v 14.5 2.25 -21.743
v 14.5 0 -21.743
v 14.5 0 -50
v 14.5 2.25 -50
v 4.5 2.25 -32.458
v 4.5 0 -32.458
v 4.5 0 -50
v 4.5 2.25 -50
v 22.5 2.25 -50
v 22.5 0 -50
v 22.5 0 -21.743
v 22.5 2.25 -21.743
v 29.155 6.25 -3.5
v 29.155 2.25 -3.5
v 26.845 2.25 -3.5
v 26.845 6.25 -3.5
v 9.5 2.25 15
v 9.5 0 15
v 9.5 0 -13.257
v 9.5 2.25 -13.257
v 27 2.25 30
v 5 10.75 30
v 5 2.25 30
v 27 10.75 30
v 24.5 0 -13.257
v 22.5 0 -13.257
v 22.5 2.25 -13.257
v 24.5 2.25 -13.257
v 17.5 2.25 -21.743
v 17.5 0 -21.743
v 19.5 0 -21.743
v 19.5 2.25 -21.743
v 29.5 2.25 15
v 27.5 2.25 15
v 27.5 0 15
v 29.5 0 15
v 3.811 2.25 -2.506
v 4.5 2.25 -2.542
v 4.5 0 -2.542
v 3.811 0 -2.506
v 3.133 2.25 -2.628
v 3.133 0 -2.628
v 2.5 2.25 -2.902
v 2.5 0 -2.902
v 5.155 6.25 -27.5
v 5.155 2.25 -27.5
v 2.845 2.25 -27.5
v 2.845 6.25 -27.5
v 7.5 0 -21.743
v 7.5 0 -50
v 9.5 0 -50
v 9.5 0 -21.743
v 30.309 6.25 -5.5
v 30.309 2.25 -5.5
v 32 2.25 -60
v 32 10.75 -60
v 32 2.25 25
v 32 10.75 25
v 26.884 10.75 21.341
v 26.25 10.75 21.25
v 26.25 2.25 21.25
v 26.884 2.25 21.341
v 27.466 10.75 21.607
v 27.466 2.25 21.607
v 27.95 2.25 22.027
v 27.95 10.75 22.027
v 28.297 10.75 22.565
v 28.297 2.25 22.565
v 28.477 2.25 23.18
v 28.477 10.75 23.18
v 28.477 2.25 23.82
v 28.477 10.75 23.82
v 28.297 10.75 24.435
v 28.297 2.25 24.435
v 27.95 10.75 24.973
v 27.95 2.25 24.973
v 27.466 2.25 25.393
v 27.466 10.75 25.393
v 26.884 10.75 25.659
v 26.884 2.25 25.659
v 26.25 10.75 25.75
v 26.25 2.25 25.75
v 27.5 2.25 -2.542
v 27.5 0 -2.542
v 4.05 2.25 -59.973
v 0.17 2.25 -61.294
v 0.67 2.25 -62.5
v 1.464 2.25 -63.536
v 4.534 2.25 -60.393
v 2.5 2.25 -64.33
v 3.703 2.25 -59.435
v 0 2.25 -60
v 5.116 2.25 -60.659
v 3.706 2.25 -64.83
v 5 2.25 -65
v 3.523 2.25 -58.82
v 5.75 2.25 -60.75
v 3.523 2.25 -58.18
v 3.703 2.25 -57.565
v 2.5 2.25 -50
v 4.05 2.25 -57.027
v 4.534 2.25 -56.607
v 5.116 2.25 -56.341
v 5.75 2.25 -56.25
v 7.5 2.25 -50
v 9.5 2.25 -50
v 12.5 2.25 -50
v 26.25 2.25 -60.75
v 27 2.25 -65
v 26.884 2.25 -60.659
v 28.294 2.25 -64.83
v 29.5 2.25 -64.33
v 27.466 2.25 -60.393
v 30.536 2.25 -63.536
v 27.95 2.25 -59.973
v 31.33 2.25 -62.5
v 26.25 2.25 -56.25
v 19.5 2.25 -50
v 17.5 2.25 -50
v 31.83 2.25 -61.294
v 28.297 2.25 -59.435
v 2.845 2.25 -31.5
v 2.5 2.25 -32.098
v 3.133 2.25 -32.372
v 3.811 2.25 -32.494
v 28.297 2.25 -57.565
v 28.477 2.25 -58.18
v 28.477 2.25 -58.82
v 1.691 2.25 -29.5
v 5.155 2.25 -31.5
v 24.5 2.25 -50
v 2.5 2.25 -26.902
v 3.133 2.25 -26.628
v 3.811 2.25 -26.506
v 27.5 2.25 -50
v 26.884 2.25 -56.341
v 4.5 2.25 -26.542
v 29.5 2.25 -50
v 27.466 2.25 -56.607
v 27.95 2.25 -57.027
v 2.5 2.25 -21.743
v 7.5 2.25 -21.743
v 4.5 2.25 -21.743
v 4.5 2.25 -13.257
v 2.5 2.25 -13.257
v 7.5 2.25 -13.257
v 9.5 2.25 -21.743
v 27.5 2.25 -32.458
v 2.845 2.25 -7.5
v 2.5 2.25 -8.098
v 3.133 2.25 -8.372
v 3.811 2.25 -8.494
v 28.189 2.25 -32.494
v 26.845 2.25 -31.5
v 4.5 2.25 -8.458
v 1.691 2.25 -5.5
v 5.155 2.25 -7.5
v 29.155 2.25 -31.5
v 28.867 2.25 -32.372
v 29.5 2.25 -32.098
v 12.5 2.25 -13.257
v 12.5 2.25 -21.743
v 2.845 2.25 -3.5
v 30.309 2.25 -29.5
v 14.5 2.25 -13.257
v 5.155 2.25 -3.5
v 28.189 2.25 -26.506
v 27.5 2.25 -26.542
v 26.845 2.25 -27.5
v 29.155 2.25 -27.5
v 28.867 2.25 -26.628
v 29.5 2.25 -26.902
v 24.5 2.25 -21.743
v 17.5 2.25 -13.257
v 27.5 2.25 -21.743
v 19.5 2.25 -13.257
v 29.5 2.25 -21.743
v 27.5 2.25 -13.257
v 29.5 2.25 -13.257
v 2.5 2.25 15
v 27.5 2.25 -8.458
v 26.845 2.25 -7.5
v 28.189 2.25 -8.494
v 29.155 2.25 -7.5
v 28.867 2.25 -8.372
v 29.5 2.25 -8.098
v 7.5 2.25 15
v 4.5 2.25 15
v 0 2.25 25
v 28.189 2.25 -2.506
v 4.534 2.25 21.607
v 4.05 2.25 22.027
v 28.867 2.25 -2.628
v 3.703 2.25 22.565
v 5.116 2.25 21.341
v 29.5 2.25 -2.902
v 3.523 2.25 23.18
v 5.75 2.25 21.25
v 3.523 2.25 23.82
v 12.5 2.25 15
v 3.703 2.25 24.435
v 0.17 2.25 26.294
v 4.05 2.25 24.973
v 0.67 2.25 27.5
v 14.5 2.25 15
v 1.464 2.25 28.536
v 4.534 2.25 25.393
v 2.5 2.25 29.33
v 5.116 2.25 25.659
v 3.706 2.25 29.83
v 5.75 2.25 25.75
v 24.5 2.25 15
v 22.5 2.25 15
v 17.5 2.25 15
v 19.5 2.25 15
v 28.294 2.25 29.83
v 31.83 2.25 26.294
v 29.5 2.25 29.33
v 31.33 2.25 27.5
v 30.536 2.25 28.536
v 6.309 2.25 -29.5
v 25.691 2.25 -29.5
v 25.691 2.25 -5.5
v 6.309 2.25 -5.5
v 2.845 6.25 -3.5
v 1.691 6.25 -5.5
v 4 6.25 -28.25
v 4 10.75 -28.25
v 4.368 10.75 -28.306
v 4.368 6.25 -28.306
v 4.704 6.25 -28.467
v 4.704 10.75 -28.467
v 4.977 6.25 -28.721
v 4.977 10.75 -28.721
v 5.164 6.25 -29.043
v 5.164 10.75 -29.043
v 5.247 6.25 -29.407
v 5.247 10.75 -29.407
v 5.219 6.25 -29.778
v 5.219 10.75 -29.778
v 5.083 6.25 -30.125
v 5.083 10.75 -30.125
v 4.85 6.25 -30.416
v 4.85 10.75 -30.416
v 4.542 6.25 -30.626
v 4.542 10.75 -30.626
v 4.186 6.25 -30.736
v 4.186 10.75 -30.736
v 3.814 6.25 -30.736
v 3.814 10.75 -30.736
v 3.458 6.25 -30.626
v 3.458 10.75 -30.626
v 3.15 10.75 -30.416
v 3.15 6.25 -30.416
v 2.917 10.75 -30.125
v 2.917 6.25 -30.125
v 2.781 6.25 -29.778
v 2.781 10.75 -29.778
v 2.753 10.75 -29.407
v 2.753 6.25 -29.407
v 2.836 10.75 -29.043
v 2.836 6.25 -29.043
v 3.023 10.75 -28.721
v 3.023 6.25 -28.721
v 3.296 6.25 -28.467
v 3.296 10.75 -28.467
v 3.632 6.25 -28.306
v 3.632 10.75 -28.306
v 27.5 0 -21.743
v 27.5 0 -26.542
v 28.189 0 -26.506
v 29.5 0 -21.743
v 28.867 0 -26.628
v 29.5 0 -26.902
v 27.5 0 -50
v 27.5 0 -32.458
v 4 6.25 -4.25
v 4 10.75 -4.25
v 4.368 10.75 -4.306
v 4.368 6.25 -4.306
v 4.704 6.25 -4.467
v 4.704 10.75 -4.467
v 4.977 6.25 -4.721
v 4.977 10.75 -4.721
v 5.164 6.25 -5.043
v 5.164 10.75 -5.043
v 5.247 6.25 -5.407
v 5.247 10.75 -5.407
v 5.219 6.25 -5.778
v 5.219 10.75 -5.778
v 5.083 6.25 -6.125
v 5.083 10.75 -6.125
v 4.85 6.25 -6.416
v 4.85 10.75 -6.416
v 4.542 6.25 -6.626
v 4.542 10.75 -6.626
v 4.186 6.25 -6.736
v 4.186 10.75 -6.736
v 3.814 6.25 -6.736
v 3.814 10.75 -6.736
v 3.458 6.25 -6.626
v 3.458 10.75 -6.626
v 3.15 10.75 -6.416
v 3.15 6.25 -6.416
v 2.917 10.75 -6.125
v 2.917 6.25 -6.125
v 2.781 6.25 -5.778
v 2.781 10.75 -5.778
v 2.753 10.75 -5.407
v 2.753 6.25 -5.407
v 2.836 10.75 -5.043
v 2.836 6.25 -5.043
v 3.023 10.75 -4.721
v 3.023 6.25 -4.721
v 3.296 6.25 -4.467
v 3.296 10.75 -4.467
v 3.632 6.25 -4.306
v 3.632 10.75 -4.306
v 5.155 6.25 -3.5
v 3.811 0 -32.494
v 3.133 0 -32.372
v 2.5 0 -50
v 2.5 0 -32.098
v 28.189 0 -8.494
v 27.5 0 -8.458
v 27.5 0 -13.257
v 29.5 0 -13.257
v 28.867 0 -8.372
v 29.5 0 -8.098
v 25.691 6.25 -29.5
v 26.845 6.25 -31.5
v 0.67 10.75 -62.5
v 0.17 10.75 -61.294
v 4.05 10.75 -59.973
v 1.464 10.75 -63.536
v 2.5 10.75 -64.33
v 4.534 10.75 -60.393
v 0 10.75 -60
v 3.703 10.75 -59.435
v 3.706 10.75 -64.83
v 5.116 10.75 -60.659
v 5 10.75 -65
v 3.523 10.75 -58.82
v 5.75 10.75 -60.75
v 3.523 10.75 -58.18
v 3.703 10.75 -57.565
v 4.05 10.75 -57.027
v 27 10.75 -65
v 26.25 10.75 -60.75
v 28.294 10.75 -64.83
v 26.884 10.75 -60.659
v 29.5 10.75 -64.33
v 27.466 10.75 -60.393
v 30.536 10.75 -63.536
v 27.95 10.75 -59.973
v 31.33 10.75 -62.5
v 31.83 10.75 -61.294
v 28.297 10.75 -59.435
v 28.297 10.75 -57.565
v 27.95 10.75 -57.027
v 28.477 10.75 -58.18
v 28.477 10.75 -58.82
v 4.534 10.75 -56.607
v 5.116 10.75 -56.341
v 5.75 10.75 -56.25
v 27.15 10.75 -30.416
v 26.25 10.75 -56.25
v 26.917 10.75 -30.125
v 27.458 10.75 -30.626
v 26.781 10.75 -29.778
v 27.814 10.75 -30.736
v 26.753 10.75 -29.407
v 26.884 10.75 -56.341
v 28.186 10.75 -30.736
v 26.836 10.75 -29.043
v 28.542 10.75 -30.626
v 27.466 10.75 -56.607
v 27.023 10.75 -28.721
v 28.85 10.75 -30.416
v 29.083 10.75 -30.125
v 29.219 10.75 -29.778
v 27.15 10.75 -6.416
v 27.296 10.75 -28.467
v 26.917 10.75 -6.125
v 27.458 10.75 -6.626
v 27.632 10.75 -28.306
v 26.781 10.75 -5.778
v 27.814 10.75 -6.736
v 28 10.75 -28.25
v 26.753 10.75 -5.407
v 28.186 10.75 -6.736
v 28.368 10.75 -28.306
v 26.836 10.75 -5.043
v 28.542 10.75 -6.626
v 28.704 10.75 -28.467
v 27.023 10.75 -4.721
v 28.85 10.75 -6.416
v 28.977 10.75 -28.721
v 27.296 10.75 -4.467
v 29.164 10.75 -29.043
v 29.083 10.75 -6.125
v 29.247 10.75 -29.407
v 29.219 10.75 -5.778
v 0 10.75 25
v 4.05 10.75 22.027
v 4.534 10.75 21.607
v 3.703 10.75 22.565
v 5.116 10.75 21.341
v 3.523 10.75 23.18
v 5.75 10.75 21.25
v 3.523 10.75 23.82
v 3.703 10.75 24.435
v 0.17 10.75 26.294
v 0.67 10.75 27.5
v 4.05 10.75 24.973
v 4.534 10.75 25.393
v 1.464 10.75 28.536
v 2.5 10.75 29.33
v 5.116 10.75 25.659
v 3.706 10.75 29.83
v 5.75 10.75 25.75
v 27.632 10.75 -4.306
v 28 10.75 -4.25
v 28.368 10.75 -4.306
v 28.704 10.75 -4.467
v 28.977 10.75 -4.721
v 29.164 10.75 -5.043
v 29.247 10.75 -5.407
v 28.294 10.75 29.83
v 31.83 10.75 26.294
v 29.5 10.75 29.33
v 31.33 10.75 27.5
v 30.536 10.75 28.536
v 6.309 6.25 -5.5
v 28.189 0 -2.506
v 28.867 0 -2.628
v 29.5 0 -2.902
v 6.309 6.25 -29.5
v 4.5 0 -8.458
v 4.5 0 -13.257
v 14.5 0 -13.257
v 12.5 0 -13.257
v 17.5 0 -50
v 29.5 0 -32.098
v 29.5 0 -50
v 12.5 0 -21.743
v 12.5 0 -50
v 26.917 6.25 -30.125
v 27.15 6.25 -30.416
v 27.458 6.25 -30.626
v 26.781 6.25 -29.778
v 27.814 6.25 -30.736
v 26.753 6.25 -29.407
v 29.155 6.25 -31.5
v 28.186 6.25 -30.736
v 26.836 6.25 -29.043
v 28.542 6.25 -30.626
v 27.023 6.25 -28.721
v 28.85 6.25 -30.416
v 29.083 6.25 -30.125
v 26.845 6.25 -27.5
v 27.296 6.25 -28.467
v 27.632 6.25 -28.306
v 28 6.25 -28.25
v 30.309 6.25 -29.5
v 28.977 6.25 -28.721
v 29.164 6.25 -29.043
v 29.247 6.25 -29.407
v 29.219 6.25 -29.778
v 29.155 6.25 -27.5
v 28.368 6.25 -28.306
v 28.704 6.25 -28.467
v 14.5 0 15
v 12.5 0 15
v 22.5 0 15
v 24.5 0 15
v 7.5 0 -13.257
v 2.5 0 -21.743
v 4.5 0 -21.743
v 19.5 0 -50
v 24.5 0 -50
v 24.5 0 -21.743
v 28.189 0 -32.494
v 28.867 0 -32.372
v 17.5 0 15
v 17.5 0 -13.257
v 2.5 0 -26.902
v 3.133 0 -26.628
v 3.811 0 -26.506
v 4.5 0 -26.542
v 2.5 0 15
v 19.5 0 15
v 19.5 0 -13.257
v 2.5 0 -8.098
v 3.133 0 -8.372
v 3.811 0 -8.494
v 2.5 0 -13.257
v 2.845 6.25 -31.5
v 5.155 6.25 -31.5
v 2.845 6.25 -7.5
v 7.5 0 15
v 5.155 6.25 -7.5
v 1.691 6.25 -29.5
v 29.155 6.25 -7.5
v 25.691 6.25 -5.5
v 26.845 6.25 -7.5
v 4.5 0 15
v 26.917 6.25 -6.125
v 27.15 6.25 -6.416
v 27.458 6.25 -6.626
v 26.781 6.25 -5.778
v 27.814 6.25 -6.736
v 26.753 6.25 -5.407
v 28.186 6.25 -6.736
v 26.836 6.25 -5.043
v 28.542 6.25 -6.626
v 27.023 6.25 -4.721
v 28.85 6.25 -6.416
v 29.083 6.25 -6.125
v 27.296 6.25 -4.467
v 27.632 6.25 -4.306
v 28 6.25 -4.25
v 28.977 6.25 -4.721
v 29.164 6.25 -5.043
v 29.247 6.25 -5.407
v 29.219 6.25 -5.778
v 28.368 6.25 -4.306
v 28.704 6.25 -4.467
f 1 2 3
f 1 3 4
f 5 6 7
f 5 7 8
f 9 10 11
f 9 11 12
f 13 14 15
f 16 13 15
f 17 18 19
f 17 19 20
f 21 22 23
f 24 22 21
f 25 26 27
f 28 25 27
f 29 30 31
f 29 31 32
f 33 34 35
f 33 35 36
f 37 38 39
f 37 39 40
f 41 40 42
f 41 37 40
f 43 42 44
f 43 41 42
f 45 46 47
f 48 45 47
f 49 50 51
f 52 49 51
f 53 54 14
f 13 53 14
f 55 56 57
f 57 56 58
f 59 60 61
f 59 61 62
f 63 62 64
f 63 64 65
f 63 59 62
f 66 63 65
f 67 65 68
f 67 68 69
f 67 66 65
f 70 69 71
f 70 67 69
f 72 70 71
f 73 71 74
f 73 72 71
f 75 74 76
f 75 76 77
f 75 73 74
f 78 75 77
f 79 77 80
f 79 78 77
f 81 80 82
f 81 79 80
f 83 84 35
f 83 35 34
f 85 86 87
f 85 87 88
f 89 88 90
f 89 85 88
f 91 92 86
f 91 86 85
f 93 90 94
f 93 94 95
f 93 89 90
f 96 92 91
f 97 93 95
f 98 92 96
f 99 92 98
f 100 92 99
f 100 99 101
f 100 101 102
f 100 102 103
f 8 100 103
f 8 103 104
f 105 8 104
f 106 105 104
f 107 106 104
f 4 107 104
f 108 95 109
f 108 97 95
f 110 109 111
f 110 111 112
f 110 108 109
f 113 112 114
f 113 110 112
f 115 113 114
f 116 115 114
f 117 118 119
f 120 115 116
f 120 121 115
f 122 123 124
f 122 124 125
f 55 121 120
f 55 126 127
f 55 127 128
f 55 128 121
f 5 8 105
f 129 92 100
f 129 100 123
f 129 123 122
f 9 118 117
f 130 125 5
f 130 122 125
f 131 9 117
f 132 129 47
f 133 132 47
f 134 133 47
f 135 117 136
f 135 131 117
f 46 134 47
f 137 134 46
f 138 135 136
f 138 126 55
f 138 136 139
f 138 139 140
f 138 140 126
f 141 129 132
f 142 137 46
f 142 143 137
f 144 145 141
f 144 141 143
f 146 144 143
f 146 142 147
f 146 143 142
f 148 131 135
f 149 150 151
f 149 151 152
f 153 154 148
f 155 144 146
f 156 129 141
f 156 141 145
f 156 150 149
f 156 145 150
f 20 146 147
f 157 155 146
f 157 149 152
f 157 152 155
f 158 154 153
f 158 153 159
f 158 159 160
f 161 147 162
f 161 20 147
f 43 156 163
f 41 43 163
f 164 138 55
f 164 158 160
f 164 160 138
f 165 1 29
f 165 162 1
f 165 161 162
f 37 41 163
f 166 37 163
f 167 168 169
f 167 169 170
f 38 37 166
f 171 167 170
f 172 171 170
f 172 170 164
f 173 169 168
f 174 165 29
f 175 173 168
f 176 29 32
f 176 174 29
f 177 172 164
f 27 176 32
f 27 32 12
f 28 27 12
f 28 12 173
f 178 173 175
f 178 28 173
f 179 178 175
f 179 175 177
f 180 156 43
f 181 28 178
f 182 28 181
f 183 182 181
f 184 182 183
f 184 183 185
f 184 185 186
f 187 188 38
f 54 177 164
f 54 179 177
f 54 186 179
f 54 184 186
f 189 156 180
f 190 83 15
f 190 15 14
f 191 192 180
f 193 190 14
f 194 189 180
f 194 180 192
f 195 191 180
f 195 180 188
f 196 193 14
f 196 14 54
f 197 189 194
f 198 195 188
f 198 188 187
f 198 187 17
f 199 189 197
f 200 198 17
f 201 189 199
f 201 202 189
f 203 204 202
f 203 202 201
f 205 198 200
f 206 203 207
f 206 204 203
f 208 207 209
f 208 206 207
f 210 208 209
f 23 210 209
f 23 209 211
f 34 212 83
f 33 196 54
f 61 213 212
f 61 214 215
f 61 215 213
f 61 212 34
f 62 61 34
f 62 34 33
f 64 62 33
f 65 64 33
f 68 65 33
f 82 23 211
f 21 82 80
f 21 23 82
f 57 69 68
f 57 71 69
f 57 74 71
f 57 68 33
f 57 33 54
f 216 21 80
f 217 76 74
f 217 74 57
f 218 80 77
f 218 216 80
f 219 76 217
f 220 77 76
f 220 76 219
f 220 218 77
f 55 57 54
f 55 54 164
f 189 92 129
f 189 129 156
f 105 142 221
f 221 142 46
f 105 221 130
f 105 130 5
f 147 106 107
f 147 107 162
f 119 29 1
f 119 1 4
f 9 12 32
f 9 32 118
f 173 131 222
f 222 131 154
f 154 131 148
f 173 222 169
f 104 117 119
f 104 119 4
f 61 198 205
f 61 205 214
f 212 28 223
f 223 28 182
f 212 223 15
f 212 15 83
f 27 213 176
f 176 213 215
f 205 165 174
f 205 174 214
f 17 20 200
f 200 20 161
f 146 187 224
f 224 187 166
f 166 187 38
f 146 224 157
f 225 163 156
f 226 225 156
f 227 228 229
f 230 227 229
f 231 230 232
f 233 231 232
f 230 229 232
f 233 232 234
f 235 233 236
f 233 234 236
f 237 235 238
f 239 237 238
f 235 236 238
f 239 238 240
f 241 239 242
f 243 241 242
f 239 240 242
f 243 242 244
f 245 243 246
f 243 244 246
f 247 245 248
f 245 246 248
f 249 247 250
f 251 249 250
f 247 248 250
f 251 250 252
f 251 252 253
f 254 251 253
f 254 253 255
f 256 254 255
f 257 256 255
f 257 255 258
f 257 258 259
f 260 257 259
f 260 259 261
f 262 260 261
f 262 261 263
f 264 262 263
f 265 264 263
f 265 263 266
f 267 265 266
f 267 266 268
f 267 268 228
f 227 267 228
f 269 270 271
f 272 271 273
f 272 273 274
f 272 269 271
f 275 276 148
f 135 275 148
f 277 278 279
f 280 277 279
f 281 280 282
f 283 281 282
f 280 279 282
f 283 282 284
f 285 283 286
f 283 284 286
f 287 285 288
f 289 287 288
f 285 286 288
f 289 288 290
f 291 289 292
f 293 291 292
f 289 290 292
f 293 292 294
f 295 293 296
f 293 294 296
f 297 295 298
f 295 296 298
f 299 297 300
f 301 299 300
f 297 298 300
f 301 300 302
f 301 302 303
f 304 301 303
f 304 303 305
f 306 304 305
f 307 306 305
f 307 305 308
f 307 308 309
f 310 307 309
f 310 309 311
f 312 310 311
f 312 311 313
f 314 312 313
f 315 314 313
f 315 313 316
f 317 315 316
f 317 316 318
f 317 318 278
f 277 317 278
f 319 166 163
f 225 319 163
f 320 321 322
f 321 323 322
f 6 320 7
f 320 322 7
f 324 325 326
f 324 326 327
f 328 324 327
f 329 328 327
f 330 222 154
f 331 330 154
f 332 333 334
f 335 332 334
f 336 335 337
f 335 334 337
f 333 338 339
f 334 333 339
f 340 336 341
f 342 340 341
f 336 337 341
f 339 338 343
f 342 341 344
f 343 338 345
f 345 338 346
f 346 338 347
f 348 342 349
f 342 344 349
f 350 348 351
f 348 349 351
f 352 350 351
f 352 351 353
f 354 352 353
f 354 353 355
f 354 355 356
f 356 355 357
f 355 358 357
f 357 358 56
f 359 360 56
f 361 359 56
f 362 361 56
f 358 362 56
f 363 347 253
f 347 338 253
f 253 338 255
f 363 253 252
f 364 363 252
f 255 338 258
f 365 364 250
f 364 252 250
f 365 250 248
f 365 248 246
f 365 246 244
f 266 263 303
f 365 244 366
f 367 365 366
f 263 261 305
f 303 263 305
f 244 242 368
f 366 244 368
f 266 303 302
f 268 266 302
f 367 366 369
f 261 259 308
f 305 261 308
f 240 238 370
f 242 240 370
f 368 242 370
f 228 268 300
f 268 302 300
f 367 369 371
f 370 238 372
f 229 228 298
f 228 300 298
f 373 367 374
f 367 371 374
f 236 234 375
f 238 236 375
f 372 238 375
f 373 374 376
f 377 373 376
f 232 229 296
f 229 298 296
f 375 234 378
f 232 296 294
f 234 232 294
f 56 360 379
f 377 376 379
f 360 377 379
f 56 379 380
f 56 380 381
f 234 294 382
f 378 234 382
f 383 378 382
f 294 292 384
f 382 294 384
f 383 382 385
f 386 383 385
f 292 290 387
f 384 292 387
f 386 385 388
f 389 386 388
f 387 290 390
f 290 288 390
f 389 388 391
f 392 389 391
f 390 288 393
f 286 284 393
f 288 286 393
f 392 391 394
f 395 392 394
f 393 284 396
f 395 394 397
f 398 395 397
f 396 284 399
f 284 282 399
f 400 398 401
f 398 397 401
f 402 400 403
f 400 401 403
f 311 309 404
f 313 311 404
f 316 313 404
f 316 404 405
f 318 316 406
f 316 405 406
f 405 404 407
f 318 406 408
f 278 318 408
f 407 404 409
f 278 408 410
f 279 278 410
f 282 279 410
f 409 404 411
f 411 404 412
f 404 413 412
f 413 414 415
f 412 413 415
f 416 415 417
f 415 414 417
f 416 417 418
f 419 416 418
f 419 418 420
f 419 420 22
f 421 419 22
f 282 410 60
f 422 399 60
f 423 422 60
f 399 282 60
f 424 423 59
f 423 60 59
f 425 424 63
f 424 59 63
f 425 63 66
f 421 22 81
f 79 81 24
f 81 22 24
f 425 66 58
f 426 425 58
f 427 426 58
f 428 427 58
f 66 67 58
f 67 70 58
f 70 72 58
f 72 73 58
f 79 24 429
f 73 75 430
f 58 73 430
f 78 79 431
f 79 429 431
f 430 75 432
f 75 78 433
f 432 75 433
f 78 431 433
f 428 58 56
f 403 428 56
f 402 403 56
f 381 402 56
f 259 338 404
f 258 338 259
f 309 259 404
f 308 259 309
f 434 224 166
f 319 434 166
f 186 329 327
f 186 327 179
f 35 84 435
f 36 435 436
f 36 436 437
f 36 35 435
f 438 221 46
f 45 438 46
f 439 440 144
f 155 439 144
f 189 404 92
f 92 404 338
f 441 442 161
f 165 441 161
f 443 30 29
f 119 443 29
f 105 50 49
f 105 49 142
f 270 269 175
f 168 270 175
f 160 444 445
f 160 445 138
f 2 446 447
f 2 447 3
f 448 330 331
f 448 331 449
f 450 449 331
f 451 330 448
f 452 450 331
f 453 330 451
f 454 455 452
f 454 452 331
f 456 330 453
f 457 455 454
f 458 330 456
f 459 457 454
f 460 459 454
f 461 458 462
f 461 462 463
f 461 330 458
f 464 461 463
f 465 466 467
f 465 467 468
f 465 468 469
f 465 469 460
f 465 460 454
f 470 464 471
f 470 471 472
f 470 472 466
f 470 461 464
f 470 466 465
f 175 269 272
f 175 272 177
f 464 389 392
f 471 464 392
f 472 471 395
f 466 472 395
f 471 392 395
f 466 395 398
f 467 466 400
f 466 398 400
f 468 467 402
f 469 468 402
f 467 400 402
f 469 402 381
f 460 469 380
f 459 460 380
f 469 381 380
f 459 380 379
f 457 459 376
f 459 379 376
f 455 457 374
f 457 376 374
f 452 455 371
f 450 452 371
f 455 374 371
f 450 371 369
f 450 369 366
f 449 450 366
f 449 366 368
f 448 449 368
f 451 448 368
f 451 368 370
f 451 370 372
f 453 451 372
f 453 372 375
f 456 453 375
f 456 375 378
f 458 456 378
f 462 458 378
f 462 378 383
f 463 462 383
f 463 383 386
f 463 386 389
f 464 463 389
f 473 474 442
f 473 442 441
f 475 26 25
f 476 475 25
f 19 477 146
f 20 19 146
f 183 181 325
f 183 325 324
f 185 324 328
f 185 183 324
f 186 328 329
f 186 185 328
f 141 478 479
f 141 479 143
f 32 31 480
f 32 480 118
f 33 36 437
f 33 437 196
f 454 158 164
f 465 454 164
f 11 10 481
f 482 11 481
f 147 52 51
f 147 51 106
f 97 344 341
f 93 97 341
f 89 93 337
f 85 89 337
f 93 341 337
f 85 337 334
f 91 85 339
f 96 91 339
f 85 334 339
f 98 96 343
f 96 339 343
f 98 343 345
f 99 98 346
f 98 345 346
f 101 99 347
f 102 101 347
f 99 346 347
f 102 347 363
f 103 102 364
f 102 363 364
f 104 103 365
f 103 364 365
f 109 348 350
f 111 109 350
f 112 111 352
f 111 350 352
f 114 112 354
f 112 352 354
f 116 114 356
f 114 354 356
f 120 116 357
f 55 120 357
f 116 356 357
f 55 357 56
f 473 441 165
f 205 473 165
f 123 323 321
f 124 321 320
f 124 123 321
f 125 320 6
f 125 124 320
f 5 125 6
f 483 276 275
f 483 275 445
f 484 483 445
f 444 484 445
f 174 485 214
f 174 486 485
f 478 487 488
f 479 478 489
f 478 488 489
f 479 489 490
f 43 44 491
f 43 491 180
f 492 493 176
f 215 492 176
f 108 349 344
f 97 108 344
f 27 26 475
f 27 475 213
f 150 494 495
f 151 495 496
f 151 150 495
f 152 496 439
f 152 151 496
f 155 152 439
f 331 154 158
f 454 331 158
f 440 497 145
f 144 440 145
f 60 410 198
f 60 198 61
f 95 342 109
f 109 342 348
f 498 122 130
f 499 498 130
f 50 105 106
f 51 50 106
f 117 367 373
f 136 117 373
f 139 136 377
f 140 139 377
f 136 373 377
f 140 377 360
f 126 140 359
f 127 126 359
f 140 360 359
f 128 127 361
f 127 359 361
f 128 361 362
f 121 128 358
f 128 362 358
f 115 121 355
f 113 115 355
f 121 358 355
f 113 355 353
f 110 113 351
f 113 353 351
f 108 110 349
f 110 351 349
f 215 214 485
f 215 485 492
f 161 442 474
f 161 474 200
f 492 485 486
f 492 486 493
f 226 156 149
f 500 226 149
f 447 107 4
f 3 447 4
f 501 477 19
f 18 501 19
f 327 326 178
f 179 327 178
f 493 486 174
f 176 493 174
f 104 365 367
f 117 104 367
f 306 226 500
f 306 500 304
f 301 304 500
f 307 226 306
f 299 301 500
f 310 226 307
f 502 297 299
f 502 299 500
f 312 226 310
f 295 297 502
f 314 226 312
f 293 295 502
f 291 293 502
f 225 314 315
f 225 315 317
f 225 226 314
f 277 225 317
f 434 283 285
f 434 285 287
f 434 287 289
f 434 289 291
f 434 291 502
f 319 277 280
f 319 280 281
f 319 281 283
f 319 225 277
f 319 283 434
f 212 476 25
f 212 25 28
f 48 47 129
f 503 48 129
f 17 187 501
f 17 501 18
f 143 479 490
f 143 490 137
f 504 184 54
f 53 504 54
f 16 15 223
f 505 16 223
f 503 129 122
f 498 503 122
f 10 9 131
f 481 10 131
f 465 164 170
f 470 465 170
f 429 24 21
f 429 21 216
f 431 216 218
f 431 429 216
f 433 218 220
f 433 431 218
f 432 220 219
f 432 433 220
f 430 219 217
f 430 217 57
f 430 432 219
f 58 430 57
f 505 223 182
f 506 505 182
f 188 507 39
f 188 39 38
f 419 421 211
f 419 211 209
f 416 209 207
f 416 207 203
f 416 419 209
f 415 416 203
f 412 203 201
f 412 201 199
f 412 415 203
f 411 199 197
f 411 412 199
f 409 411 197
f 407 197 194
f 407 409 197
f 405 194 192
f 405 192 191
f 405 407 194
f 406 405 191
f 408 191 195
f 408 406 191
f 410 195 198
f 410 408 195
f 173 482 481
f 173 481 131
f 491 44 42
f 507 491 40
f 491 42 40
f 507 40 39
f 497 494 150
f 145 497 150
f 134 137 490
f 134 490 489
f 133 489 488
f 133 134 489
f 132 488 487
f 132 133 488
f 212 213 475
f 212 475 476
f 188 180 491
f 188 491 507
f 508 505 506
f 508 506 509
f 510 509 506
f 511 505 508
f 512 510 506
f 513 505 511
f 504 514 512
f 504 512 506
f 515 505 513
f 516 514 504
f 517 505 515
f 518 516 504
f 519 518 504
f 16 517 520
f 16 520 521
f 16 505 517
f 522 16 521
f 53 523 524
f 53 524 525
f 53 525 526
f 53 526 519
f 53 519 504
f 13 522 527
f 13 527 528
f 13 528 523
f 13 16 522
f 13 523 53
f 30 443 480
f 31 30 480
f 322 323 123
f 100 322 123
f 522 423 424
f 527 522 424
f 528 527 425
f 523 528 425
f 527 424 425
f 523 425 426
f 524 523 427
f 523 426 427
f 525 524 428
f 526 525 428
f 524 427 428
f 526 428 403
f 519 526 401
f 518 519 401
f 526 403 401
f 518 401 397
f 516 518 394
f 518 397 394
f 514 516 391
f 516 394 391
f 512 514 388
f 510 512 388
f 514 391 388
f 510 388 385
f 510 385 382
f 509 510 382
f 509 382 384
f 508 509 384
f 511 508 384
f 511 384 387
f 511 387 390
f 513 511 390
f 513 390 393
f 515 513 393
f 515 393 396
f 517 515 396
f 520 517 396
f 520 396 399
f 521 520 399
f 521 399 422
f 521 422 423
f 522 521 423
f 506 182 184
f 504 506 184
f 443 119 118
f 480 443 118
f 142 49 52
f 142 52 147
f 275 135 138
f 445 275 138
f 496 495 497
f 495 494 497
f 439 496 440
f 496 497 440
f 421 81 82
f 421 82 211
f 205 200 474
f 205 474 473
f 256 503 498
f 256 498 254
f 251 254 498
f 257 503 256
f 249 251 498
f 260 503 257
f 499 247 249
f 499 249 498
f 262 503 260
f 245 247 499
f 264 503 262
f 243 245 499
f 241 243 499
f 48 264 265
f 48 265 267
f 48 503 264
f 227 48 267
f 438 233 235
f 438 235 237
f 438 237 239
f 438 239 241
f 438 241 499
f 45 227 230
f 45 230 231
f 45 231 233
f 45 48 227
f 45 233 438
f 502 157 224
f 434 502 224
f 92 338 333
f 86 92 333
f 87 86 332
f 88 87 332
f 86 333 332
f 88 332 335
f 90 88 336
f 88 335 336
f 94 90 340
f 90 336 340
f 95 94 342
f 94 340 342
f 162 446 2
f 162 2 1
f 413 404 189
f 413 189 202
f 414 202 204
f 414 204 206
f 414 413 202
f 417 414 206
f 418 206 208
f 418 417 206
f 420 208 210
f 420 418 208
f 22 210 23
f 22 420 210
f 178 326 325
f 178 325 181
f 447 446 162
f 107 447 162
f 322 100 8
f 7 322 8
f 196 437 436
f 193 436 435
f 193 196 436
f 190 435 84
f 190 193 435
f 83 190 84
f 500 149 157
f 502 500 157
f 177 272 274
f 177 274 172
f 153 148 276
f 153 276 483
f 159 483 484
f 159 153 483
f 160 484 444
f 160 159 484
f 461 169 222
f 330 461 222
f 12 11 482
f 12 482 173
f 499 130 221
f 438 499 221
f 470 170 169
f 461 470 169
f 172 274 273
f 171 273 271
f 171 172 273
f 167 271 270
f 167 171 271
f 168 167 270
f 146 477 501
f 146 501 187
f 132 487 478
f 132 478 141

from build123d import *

# Parameters (mm, degrees)
SKETCH_1_W                = 32
SKETCH_1_H                = 35
EXTRUDE_1_DEPTH           = 10.75
SKETCH_3_W                = 3
SKETCH_3_H                = 2.25
CUT_EXTRUDE_1_DEPTH       = 49.62676732
SKETCH_6_R                = 4.5
CUT_EXTRUDE_4_DEPTH       = 2.25
EXTRUDE_2_DEPTH           = 8.5
SKETCH_10_R               = 1.25
CUT_EXTRUDE_5_DEPTH       = 74.243173743
CUT_EXTRUDE_8_DEPTH       = 4
SKETCH_13_W               = 2
SKETCH_13_H               = 2.25
EXTRUDE_3_DEPTH           = 15
SKETCH_14_R               = 3
CUT_EXTRUDE_9_DEPTH       = 73.946898495
CUT_EXTRUDE_10_DEPTH      = 68.797953509
CUT_EXTRUDE_10_DEPTH_BACK = 68.797953509
SKETCH_15_W               = 8.485281374
SKETCH_15_H               = 2.25


with BuildPart() as part:
    # Эскиз1 → Бобышка-Вытянуть1 (new body)
    with BuildSketch(Plane(origin=(0, 0, 0), x_dir=(1, 0, 0), z_dir=(0, 1, 0))):
        with Locations((16, 17.5)):
            Rectangle(SKETCH_1_W, SKETCH_1_H)
    extrude(amount=EXTRUDE_1_DEPTH)

    # Эскиз3 → Вырез-Вытянуть1 (cut, through all)
    with BuildSketch(Plane.XY):
        with Locations((16, 1.125)):
            Rectangle(SKETCH_3_W, SKETCH_3_H)
        with Locations((21, 1.125)):
            Rectangle(SKETCH_3_W, SKETCH_3_H)
        with Locations((26, 1.125)):
            Rectangle(SKETCH_3_W, SKETCH_3_H)
        with Locations((31, 1.125)):
            Rectangle(SKETCH_3_W, SKETCH_3_H)
        with Locations((11, 1.125)):
            Rectangle(SKETCH_3_W, SKETCH_3_H)
        with Locations((6, 1.125)):
            Rectangle(SKETCH_3_W, SKETCH_3_H)
        with Locations((1, 1.125)):
            Rectangle(SKETCH_3_W, SKETCH_3_H)
    extrude(amount=-CUT_EXTRUDE_1_DEPTH, mode=Mode.SUBTRACT)

    # Эскиз6 → Вырез-Вытянуть4 (cut)
    with BuildSketch(Plane.XZ):
        with Locations((16, -17.5)):
            Circle(SKETCH_6_R)
    extrude(amount=-CUT_EXTRUDE_4_DEPTH, mode=Mode.SUBTRACT)

    # Эскиз7 → Бобышка-Вытянуть2 (add)
    with BuildSketch(Plane(origin=(0, 10.75, 0), x_dir=(1, 0, 0), z_dir=(0, 1, 0))):
        with BuildLine():
            Line((0, 0), (0, -25))
            ThreePointArc((0, -25), (1.464466094, -28.535533906), (5, -30))
            Line((5, -30), (27, -30))
            ThreePointArc((27, -30), (30.535533906, -28.535533906), (32, -25))
            Line((32, -25), (32, 0))
            Line((32, 0), (0, 0))
        make_face()
        with BuildLine():
            Line((5.75, -21.25), (26.25, -21.25))
            ThreePointArc((26.25, -21.25), (28.5, -23.5), (26.25, -25.75))
            Line((26.25, -25.75), (5.75, -25.75))
            ThreePointArc((5.75, -25.75), (3.5, -23.5), (5.75, -21.25))
        make_face(mode=Mode.SUBTRACT)
    extrude_2 = extrude(amount=-EXTRUDE_2_DEPTH)

    # Зеркальное отражение1: Бобышка-Вытянуть2 across plane
    add(extrude_2.mirror(Plane.XY.offset(-17.5)))

    # Эскиз10 → Вырез-Вытянуть5 (cut, through all)
    with BuildSketch(Plane(origin=(0, 10.75, 0), x_dir=(1, 0, 0), z_dir=(0, 1, 0))):
        with Locations(Location((4, 29.5, 0), (0, 0, 270))):
            Circle(SKETCH_10_R)
        with Locations(Location((4, 5.5, 0), (0, 0, 270))):
            Circle(SKETCH_10_R)
        with Locations(Location((28, 5.5, 0), (0, 0, 270))):
            Circle(SKETCH_10_R)
        with Locations(Location((28, 29.5, 0), (0, 0, 270))):
            Circle(SKETCH_10_R)
    extrude(amount=-CUT_EXTRUDE_5_DEPTH, mode=Mode.SUBTRACT)

    # Эскиз11 → Вырез-Вытянуть8 (cut)
    with BuildSketch(Plane.XZ.offset(-2.25)):
        Polygon((25.690598923, -5.5), (26.845299462, -7.5), (29.154700538, -7.5), (30.309401077, -5.5), (29.154700538, -3.5), (26.845299462, -3.5), align=None)
        Polygon((6.309401077, -5.5), (5.154700538, -3.5), (2.845299462, -3.5), (1.690598923, -5.5), (2.845299462, -7.5), (5.154700538, -7.5), align=None)
        Polygon((6.309401077, -29.5), (5.154700538, -27.5), (2.845299462, -27.5), (1.690598923, -29.5), (2.845299462, -31.5), (5.154700538, -31.5), align=None)
        Polygon((25.690598923, -29.5), (26.845299462, -31.5), (29.154700538, -31.5), (30.309401077, -29.5), (29.154700538, -27.5), (26.845299462, -27.5), align=None)
    extrude(amount=-CUT_EXTRUDE_8_DEPTH, mode=Mode.SUBTRACT)

    # Эскиз13 → Бобышка-Вытянуть3 (add)
    with BuildSketch(Plane.XY):
        with Locations((28.5, 1.125)):
            Rectangle(SKETCH_13_W, SKETCH_13_H)
        with Locations((23.5, 1.125)):
            Rectangle(SKETCH_13_W, SKETCH_13_H)
        with Locations((18.5, 1.125)):
            Rectangle(SKETCH_13_W, SKETCH_13_H)
        with Locations((13.5, 1.125)):
            Rectangle(SKETCH_13_W, SKETCH_13_H)
        with Locations((8.5, 1.125)):
            Rectangle(SKETCH_13_W, SKETCH_13_H)
        with Locations((3.5, 1.125)):
            Rectangle(SKETCH_13_W, SKETCH_13_H)
    extrude_3 = extrude(amount=EXTRUDE_3_DEPTH)

    # Зеркальное отражение2: Бобышка-Вытянуть3 across plane
    add(extrude_3.mirror(Plane.XY.offset(-17.5)))

    # Эскиз14 → Вырез-Вытянуть9 (cut, through all)
    with BuildSketch(Plane.XZ.offset(-2.25)):
        with Locations((28, -5.5)):
            Circle(SKETCH_14_R)
        with Locations((28, -29.5)):
            Circle(SKETCH_14_R)
        with Locations((4, -29.5)):
            Circle(SKETCH_14_R)
        with Locations((4, -5.5)):
            Circle(SKETCH_14_R)
    extrude(amount=CUT_EXTRUDE_9_DEPTH, mode=Mode.SUBTRACT)

    # Эскиз15 → Вырез-Вытянуть10 (cut, two sides: drawn at the far end of the back side and taken through both)
    with BuildSketch(Plane(origin=(16, 0, 0), x_dir=(0, 0, -1), z_dir=(1, 0, 0)).offset(-CUT_EXTRUDE_10_DEPTH_BACK)):
        with Locations((17.5, 1.125)):
            Rectangle(SKETCH_15_W, SKETCH_15_H)
    extrude(amount=CUT_EXTRUDE_10_DEPTH + CUT_EXTRUDE_10_DEPTH_BACK, mode=Mode.SUBTRACT)


solid = part.part
